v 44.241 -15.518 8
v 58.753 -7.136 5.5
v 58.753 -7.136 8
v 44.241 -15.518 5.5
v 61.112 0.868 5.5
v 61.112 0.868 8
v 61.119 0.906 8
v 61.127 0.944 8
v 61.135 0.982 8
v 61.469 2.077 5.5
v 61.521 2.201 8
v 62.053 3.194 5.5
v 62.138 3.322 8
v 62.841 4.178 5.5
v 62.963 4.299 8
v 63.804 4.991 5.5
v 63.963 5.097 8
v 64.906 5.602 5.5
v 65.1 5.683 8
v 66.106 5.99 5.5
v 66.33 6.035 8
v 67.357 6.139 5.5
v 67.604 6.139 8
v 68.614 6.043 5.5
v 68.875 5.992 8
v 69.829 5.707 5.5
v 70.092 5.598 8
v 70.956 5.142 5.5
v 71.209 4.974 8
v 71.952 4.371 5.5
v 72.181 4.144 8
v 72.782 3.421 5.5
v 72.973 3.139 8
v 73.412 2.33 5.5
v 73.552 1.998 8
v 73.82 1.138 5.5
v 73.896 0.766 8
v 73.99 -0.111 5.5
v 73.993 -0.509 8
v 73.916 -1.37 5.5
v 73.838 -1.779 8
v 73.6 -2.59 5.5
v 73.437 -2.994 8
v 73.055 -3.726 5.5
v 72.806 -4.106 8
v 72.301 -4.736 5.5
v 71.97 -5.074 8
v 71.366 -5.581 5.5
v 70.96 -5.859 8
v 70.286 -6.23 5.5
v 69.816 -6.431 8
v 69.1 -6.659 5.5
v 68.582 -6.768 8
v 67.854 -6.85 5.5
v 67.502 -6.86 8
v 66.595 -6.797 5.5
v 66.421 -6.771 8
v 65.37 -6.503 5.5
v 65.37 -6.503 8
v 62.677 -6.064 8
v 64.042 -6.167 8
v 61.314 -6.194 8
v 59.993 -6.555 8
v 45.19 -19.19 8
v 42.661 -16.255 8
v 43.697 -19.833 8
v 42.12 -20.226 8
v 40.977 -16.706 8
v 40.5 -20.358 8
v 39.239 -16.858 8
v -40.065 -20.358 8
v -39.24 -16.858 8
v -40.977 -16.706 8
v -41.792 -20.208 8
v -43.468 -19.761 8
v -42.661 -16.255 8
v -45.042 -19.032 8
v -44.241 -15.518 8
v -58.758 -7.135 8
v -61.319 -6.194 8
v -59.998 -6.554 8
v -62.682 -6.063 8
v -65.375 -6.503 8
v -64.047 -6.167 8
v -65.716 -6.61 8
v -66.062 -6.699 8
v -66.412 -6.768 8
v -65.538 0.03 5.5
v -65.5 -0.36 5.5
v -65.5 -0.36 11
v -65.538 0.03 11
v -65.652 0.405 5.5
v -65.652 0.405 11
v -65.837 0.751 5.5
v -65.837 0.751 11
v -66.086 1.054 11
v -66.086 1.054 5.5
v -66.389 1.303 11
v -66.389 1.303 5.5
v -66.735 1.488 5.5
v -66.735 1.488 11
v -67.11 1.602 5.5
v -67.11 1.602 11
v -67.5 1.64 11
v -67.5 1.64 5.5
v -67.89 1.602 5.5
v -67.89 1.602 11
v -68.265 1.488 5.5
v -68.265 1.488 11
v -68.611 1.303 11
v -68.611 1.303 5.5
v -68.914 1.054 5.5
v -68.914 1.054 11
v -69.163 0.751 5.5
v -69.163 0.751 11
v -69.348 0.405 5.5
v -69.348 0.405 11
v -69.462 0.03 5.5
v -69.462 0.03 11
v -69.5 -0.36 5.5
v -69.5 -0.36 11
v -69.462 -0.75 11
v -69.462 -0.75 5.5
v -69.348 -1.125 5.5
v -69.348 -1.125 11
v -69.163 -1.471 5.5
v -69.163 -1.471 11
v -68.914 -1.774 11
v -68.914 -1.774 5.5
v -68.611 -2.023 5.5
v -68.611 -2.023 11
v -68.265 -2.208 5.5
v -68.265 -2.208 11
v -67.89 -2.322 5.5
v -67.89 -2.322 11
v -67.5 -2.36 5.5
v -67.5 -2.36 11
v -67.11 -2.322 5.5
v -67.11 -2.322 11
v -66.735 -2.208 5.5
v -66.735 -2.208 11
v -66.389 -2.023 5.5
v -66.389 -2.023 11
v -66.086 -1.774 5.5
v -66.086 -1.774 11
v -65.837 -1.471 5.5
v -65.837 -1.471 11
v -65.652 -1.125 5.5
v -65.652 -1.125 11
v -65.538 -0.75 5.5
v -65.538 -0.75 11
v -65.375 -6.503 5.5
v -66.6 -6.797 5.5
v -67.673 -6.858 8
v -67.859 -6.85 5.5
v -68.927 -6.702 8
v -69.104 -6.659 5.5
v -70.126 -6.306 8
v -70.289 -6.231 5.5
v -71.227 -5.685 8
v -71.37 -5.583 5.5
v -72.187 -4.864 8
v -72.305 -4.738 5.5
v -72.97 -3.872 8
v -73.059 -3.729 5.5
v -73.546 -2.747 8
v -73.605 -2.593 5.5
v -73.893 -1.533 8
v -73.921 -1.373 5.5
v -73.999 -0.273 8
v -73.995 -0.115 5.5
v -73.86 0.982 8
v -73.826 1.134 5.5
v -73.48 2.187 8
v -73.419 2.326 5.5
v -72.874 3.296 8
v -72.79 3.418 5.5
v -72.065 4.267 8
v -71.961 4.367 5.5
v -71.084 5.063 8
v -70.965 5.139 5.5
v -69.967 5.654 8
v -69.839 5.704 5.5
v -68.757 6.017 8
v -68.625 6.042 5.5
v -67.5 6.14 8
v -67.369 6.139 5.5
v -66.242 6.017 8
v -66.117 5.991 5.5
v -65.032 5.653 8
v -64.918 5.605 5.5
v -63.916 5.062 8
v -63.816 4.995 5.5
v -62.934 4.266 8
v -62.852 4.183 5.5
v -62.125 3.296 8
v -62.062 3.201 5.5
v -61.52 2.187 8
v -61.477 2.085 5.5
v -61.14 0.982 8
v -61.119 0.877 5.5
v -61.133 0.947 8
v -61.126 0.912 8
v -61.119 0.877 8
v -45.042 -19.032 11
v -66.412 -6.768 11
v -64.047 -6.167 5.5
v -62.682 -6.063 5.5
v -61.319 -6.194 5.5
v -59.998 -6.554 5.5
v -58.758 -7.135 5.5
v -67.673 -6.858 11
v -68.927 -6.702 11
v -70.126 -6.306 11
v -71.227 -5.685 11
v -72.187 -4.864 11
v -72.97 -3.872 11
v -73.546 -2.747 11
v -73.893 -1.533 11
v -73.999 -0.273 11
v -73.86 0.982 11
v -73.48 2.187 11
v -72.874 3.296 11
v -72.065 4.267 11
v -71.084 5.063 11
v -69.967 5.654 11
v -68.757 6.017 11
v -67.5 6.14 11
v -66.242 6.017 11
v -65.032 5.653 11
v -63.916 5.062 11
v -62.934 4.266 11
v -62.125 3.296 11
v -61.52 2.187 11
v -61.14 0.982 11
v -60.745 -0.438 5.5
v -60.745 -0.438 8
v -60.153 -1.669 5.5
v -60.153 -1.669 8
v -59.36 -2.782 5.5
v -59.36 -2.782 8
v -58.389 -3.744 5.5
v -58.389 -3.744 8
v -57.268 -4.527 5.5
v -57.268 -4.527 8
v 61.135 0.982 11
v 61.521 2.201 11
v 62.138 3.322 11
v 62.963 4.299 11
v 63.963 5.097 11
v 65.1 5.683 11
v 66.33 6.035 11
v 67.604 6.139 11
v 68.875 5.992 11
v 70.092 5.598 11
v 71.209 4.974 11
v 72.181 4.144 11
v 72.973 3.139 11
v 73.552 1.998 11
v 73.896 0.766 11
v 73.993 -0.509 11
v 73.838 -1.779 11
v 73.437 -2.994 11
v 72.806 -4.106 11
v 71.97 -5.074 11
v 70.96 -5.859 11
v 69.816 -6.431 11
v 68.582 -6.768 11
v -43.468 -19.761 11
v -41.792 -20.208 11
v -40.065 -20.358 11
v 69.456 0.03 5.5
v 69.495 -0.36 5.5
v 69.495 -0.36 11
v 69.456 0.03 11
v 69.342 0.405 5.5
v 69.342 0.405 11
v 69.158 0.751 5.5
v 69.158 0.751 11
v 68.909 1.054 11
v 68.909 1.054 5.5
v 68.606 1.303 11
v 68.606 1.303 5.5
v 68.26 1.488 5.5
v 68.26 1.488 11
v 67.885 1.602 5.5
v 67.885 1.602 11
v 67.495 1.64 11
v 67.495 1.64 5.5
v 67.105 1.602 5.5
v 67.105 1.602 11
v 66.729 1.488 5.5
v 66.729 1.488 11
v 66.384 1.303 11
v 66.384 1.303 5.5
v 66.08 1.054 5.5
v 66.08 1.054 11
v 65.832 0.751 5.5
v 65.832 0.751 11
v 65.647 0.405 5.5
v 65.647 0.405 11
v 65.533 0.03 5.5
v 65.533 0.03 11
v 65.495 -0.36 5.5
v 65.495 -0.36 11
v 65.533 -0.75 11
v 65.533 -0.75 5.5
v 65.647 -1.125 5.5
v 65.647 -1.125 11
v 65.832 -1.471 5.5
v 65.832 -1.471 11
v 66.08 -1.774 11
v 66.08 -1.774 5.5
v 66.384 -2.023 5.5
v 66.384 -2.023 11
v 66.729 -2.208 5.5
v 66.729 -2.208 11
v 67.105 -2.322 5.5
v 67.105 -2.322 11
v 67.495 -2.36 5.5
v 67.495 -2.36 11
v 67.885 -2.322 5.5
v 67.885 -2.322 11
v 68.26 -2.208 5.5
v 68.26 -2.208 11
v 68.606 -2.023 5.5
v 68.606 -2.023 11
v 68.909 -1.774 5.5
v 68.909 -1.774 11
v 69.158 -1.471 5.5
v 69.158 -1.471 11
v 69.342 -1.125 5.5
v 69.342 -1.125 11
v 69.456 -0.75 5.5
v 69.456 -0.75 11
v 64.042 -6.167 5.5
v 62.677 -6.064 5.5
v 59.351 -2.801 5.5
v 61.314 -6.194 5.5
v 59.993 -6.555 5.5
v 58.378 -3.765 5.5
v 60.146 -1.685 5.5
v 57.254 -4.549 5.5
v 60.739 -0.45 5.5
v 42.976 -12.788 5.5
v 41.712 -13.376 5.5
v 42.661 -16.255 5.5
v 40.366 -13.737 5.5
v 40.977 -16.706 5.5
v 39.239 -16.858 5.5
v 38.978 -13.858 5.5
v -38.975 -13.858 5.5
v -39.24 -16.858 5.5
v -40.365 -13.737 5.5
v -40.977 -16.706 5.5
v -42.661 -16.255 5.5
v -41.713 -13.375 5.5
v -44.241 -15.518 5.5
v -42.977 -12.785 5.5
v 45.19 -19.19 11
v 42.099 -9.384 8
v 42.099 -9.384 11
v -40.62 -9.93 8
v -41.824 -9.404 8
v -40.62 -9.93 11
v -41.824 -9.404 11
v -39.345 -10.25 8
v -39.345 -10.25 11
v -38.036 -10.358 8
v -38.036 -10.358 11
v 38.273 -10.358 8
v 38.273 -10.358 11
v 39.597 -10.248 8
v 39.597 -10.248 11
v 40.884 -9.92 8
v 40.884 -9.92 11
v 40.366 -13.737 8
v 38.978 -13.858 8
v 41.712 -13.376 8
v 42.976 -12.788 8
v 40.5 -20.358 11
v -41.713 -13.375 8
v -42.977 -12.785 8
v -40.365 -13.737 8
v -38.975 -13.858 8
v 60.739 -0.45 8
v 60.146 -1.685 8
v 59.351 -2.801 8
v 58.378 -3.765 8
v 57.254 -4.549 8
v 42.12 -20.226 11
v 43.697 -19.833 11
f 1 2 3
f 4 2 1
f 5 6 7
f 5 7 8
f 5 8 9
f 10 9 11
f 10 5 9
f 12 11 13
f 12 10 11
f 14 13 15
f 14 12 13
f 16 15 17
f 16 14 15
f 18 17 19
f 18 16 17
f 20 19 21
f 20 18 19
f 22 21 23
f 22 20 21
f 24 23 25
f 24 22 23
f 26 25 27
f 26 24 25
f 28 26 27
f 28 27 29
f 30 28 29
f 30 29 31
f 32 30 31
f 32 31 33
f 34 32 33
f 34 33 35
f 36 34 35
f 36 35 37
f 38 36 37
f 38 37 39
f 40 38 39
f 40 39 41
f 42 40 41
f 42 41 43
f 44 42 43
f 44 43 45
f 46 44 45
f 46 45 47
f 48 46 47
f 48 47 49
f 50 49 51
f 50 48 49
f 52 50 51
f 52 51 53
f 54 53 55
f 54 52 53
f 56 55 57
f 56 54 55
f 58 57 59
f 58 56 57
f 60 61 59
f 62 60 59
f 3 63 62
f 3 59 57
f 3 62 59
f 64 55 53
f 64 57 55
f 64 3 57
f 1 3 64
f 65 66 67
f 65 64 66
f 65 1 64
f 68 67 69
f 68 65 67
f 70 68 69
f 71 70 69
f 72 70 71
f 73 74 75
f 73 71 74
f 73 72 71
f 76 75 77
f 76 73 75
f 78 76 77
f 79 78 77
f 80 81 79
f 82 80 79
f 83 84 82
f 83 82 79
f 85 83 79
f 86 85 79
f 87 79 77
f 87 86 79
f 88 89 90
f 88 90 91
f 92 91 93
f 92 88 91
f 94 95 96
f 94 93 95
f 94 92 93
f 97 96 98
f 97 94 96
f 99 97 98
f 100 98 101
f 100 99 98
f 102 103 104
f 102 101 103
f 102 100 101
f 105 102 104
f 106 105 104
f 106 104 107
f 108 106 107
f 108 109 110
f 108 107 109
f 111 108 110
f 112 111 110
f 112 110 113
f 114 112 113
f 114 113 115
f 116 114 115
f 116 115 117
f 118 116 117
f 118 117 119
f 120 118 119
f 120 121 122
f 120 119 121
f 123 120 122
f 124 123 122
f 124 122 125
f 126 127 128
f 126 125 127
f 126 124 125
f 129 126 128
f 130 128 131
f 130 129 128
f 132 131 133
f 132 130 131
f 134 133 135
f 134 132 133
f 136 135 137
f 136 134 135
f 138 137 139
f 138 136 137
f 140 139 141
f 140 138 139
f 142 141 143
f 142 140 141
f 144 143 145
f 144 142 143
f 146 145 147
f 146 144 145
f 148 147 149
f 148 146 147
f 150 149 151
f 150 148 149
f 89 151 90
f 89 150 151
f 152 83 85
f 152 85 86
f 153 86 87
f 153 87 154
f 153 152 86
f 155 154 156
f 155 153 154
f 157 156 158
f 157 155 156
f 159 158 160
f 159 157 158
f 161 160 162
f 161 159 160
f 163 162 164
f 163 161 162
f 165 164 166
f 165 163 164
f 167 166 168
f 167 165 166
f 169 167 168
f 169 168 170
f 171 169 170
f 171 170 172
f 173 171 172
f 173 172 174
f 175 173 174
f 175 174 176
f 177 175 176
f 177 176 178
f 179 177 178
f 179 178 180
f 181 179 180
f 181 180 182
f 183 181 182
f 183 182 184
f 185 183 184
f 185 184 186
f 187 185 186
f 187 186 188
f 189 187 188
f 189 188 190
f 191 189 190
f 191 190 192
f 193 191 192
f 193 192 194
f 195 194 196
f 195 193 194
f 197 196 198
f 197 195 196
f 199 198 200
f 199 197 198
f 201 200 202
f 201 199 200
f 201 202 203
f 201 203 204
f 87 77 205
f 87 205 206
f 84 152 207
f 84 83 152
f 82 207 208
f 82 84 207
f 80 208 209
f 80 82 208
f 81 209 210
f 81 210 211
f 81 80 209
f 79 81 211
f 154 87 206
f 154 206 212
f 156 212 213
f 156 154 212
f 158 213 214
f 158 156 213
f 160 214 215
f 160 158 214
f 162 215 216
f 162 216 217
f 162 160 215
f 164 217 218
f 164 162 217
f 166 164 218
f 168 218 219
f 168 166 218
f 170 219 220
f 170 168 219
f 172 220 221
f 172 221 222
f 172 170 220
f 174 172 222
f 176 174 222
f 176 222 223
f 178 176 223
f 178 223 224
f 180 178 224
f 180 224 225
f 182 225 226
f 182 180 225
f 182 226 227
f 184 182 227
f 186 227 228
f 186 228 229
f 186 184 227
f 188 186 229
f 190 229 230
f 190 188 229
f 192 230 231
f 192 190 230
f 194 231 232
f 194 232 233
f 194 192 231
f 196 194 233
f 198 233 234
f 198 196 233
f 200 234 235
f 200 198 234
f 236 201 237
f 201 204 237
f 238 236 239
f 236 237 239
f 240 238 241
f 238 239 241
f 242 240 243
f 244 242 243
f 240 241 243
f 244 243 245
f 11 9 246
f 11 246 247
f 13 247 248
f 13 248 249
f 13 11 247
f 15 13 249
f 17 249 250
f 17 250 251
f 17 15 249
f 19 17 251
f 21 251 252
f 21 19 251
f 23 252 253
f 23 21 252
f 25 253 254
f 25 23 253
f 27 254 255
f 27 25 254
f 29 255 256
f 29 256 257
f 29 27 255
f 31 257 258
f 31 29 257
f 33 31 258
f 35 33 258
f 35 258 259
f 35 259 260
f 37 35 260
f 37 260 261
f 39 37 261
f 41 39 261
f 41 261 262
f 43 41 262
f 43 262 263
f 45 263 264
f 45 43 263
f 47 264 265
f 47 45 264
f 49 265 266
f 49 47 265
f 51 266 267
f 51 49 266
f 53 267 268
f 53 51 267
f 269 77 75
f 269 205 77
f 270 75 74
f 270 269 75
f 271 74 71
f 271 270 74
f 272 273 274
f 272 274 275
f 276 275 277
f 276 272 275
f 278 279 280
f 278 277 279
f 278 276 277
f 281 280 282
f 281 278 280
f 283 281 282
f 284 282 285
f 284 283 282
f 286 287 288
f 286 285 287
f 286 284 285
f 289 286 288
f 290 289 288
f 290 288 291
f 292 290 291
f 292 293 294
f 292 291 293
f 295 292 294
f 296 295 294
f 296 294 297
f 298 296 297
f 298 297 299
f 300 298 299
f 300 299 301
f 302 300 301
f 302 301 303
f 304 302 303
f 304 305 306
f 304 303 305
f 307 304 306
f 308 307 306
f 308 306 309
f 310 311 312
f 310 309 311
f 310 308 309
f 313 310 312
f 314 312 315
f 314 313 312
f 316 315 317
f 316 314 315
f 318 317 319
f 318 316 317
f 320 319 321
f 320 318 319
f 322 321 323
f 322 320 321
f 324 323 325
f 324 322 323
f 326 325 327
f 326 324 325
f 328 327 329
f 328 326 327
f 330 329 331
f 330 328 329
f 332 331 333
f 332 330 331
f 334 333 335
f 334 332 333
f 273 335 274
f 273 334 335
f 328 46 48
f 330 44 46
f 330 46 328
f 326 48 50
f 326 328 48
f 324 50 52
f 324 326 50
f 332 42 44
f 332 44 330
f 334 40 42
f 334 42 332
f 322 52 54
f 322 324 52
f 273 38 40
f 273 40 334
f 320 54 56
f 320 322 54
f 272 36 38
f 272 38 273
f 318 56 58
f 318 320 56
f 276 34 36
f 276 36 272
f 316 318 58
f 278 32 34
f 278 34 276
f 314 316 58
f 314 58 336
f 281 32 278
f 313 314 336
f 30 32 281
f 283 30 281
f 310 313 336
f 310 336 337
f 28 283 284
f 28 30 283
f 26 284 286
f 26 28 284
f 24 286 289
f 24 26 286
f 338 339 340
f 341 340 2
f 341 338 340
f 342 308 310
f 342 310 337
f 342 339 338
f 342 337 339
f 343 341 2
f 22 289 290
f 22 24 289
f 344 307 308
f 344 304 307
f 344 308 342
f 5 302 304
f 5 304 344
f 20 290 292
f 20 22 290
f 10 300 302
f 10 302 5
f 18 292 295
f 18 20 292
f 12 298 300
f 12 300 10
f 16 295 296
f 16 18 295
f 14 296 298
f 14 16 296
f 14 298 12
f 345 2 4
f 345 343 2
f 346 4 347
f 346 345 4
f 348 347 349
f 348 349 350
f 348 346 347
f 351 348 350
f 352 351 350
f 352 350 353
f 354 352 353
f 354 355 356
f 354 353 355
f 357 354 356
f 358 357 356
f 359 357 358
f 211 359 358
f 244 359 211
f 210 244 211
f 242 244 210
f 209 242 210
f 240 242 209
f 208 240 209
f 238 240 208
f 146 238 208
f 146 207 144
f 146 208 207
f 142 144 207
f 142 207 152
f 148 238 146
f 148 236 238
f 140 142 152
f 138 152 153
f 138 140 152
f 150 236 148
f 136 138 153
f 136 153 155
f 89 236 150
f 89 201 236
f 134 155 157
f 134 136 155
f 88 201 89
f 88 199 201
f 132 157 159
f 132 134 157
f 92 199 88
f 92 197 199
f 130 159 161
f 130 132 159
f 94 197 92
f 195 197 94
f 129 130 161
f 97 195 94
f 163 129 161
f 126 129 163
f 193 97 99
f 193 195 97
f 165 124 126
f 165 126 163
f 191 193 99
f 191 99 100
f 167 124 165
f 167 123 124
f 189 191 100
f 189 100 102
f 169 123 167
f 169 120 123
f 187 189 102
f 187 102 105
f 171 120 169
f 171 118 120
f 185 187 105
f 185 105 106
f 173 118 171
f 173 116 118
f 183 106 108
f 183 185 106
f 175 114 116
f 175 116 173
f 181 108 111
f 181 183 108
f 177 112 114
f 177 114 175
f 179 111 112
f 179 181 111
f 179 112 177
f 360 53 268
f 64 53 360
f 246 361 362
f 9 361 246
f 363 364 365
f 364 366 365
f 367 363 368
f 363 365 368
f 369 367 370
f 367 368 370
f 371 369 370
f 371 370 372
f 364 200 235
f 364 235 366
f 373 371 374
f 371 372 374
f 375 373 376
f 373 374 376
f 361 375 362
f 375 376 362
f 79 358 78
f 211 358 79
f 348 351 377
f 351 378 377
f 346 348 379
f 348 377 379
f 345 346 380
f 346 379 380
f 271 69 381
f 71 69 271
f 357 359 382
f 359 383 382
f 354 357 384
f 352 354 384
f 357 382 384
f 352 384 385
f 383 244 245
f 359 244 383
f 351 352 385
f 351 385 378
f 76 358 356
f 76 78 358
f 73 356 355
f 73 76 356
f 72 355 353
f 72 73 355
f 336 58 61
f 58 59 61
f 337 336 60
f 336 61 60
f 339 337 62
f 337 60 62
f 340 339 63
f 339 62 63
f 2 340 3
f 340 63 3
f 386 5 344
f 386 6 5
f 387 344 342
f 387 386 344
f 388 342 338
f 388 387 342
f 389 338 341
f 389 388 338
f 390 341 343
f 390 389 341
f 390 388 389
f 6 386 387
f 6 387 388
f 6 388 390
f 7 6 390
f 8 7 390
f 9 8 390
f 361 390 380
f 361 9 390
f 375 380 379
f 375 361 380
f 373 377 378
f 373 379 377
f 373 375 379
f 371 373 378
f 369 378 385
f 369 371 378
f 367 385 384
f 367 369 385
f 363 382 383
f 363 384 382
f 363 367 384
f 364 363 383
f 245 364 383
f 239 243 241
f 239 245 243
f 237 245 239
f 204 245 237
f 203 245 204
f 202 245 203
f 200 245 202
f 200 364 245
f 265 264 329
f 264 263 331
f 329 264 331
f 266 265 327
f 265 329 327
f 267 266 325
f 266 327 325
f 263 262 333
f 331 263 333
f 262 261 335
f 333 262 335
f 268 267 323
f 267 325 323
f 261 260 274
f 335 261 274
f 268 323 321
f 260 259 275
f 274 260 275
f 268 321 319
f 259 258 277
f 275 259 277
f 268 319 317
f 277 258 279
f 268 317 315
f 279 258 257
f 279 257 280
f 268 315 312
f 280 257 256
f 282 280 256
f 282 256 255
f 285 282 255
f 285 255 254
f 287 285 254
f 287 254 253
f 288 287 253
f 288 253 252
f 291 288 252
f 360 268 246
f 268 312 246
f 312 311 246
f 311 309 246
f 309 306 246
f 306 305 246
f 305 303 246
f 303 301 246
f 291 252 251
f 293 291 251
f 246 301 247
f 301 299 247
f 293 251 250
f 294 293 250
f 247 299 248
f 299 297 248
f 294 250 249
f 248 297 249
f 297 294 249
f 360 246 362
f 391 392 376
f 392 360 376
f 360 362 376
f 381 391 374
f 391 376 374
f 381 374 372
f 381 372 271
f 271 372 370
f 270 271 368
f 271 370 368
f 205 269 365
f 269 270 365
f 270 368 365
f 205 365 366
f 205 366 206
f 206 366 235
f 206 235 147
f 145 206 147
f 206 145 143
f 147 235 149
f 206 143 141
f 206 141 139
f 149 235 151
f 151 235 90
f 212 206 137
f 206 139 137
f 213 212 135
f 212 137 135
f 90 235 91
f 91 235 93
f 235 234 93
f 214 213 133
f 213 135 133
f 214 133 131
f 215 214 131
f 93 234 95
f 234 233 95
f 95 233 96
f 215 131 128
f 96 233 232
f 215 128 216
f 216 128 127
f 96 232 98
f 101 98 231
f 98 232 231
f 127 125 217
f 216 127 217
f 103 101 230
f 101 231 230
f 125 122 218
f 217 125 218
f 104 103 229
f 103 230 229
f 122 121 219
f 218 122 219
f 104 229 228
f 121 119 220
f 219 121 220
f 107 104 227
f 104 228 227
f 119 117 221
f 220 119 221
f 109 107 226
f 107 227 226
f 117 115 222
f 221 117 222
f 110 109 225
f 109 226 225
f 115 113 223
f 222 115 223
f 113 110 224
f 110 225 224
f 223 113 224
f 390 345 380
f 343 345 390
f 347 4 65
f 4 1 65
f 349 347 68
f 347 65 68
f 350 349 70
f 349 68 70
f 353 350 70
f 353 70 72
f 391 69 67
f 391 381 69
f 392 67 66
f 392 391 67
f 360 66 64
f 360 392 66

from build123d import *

# Parameters (mm, degrees)
EXTRUDE_2_DEPTH          = 2.5
EXTRUDE_3_DEPTH          = 3
CUT_EXTRUDE_1_DEPTH      = 77.94617208
CUT_EXTRUDE_1_DEPTH_BACK = 77.94617208
SKETCH_5_R               = 2
FILLET_1_R               = 10
FILLET_2_R               = 8
FILLET_3_R               = 8


with BuildPart() as part:
    # 草图1 → 凸台-拉伸2 (new body)
    with BuildSketch(Plane.XY.offset(5.5)):
        with BuildLine():
            Line((-41.12, -13.858374143), (41.12, -13.858374143))
            Line((41.12, -13.858374143), (61.27, -2.231637876))
            ThreePointArc((61.27, -2.231637876), (73.122690209, 2.892045504), (62.764706552, -4.818374143))
            Line((62.764706552, -4.818374143), (41.92, -16.858374143))
            Line((41.92, -16.858374143), (-41.92, -16.858374143))
            Line((-41.92, -16.858374143), (-62.77, -4.818374143))
            ThreePointArc((-62.77, -4.818374143), (-73.132598603, 2.884045772), (-61.27, -2.213941747))
            Line((-61.27, -2.213941747), (-41.12, -13.858374143))
        make_face()
    extrude(amount=EXTRUDE_2_DEPTH)

    # 草图4 → 凸台-拉伸3 (add)
    with BuildSketch(Plane.XY.offset(8)):
        with BuildLine():
            Line((-61.14, 0.981789849), (-40.05, -10.358374143))
            Line((-40.05, -10.358374143), (40.31, -10.358374143))
            Line((40.31, -10.358374143), (61.134706552, 0.981789849))
            ThreePointArc((61.134706552, 0.981789849), (72.181493512, 4.143779301), (68.582245444, -6.768374143))
            Line((68.582245444, -6.768374143), (42.99, -20.358374143))
            Line((42.99, -20.358374143), (-42.73, -20.358374143))
            Line((-42.73, -20.358374143), (-66.412461108, -6.768374143))
            ThreePointArc((-66.412461108, -6.768374143), (-72.874264542, 3.296129187), (-61.14, 0.981789849))
        make_face()
    extrude(amount=EXTRUDE_3_DEPTH)

    # 草图5 → 切除-拉伸1 (cut, two sides: drawn at the far end of the back side and taken through both)
    with BuildSketch(Plane.XY.offset(11).offset(-CUT_EXTRUDE_1_DEPTH_BACK)):
        with Locations((67.494706552, -0.36)):
            Circle(SKETCH_5_R)
        with Locations((-67.5, -0.36)):
            Circle(SKETCH_5_R)
    extrude(amount=CUT_EXTRUDE_1_DEPTH + CUT_EXTRUDE_1_DEPTH_BACK, mode=Mode.SUBTRACT)

    # 圆角1
    fillet_1_edges = [part.edges().sort_by_distance(p)[0] for p in [
        (41.92, -16.858374143, 6.75),
        (-41.92, -16.858374143, 6.75),
        (-42.73, -20.358374143, 9.5),
        (42.99, -20.358374143, 9.5),
    ]]
    fillet(fillet_1_edges, radius=FILLET_1_R)

    # 圆角2
    fillet_2_edges = [part.edges().sort_by_distance(p)[0] for p in [
        (61.27, -2.231637876, 6.75),
        (62.764706552, -4.818374143, 6.75),
        (-62.77, -4.818374143, 6.75),
        (-61.27, -2.213941747, 6.75),
    ]]
    fillet(fillet_2_edges, radius=FILLET_2_R)

    # 圆角3
    fillet_3_edges = [part.edges().sort_by_distance(p)[0] for p in [
        (-41.12, -13.858374143, 6.75),
        (41.12, -13.858374143, 6.75),
        (40.31, -10.358374143, 9.5),
        (-40.05, -10.358374143, 9.5),
    ]]
    fillet(fillet_3_edges, radius=FILLET_3_R)


solid = part.part
